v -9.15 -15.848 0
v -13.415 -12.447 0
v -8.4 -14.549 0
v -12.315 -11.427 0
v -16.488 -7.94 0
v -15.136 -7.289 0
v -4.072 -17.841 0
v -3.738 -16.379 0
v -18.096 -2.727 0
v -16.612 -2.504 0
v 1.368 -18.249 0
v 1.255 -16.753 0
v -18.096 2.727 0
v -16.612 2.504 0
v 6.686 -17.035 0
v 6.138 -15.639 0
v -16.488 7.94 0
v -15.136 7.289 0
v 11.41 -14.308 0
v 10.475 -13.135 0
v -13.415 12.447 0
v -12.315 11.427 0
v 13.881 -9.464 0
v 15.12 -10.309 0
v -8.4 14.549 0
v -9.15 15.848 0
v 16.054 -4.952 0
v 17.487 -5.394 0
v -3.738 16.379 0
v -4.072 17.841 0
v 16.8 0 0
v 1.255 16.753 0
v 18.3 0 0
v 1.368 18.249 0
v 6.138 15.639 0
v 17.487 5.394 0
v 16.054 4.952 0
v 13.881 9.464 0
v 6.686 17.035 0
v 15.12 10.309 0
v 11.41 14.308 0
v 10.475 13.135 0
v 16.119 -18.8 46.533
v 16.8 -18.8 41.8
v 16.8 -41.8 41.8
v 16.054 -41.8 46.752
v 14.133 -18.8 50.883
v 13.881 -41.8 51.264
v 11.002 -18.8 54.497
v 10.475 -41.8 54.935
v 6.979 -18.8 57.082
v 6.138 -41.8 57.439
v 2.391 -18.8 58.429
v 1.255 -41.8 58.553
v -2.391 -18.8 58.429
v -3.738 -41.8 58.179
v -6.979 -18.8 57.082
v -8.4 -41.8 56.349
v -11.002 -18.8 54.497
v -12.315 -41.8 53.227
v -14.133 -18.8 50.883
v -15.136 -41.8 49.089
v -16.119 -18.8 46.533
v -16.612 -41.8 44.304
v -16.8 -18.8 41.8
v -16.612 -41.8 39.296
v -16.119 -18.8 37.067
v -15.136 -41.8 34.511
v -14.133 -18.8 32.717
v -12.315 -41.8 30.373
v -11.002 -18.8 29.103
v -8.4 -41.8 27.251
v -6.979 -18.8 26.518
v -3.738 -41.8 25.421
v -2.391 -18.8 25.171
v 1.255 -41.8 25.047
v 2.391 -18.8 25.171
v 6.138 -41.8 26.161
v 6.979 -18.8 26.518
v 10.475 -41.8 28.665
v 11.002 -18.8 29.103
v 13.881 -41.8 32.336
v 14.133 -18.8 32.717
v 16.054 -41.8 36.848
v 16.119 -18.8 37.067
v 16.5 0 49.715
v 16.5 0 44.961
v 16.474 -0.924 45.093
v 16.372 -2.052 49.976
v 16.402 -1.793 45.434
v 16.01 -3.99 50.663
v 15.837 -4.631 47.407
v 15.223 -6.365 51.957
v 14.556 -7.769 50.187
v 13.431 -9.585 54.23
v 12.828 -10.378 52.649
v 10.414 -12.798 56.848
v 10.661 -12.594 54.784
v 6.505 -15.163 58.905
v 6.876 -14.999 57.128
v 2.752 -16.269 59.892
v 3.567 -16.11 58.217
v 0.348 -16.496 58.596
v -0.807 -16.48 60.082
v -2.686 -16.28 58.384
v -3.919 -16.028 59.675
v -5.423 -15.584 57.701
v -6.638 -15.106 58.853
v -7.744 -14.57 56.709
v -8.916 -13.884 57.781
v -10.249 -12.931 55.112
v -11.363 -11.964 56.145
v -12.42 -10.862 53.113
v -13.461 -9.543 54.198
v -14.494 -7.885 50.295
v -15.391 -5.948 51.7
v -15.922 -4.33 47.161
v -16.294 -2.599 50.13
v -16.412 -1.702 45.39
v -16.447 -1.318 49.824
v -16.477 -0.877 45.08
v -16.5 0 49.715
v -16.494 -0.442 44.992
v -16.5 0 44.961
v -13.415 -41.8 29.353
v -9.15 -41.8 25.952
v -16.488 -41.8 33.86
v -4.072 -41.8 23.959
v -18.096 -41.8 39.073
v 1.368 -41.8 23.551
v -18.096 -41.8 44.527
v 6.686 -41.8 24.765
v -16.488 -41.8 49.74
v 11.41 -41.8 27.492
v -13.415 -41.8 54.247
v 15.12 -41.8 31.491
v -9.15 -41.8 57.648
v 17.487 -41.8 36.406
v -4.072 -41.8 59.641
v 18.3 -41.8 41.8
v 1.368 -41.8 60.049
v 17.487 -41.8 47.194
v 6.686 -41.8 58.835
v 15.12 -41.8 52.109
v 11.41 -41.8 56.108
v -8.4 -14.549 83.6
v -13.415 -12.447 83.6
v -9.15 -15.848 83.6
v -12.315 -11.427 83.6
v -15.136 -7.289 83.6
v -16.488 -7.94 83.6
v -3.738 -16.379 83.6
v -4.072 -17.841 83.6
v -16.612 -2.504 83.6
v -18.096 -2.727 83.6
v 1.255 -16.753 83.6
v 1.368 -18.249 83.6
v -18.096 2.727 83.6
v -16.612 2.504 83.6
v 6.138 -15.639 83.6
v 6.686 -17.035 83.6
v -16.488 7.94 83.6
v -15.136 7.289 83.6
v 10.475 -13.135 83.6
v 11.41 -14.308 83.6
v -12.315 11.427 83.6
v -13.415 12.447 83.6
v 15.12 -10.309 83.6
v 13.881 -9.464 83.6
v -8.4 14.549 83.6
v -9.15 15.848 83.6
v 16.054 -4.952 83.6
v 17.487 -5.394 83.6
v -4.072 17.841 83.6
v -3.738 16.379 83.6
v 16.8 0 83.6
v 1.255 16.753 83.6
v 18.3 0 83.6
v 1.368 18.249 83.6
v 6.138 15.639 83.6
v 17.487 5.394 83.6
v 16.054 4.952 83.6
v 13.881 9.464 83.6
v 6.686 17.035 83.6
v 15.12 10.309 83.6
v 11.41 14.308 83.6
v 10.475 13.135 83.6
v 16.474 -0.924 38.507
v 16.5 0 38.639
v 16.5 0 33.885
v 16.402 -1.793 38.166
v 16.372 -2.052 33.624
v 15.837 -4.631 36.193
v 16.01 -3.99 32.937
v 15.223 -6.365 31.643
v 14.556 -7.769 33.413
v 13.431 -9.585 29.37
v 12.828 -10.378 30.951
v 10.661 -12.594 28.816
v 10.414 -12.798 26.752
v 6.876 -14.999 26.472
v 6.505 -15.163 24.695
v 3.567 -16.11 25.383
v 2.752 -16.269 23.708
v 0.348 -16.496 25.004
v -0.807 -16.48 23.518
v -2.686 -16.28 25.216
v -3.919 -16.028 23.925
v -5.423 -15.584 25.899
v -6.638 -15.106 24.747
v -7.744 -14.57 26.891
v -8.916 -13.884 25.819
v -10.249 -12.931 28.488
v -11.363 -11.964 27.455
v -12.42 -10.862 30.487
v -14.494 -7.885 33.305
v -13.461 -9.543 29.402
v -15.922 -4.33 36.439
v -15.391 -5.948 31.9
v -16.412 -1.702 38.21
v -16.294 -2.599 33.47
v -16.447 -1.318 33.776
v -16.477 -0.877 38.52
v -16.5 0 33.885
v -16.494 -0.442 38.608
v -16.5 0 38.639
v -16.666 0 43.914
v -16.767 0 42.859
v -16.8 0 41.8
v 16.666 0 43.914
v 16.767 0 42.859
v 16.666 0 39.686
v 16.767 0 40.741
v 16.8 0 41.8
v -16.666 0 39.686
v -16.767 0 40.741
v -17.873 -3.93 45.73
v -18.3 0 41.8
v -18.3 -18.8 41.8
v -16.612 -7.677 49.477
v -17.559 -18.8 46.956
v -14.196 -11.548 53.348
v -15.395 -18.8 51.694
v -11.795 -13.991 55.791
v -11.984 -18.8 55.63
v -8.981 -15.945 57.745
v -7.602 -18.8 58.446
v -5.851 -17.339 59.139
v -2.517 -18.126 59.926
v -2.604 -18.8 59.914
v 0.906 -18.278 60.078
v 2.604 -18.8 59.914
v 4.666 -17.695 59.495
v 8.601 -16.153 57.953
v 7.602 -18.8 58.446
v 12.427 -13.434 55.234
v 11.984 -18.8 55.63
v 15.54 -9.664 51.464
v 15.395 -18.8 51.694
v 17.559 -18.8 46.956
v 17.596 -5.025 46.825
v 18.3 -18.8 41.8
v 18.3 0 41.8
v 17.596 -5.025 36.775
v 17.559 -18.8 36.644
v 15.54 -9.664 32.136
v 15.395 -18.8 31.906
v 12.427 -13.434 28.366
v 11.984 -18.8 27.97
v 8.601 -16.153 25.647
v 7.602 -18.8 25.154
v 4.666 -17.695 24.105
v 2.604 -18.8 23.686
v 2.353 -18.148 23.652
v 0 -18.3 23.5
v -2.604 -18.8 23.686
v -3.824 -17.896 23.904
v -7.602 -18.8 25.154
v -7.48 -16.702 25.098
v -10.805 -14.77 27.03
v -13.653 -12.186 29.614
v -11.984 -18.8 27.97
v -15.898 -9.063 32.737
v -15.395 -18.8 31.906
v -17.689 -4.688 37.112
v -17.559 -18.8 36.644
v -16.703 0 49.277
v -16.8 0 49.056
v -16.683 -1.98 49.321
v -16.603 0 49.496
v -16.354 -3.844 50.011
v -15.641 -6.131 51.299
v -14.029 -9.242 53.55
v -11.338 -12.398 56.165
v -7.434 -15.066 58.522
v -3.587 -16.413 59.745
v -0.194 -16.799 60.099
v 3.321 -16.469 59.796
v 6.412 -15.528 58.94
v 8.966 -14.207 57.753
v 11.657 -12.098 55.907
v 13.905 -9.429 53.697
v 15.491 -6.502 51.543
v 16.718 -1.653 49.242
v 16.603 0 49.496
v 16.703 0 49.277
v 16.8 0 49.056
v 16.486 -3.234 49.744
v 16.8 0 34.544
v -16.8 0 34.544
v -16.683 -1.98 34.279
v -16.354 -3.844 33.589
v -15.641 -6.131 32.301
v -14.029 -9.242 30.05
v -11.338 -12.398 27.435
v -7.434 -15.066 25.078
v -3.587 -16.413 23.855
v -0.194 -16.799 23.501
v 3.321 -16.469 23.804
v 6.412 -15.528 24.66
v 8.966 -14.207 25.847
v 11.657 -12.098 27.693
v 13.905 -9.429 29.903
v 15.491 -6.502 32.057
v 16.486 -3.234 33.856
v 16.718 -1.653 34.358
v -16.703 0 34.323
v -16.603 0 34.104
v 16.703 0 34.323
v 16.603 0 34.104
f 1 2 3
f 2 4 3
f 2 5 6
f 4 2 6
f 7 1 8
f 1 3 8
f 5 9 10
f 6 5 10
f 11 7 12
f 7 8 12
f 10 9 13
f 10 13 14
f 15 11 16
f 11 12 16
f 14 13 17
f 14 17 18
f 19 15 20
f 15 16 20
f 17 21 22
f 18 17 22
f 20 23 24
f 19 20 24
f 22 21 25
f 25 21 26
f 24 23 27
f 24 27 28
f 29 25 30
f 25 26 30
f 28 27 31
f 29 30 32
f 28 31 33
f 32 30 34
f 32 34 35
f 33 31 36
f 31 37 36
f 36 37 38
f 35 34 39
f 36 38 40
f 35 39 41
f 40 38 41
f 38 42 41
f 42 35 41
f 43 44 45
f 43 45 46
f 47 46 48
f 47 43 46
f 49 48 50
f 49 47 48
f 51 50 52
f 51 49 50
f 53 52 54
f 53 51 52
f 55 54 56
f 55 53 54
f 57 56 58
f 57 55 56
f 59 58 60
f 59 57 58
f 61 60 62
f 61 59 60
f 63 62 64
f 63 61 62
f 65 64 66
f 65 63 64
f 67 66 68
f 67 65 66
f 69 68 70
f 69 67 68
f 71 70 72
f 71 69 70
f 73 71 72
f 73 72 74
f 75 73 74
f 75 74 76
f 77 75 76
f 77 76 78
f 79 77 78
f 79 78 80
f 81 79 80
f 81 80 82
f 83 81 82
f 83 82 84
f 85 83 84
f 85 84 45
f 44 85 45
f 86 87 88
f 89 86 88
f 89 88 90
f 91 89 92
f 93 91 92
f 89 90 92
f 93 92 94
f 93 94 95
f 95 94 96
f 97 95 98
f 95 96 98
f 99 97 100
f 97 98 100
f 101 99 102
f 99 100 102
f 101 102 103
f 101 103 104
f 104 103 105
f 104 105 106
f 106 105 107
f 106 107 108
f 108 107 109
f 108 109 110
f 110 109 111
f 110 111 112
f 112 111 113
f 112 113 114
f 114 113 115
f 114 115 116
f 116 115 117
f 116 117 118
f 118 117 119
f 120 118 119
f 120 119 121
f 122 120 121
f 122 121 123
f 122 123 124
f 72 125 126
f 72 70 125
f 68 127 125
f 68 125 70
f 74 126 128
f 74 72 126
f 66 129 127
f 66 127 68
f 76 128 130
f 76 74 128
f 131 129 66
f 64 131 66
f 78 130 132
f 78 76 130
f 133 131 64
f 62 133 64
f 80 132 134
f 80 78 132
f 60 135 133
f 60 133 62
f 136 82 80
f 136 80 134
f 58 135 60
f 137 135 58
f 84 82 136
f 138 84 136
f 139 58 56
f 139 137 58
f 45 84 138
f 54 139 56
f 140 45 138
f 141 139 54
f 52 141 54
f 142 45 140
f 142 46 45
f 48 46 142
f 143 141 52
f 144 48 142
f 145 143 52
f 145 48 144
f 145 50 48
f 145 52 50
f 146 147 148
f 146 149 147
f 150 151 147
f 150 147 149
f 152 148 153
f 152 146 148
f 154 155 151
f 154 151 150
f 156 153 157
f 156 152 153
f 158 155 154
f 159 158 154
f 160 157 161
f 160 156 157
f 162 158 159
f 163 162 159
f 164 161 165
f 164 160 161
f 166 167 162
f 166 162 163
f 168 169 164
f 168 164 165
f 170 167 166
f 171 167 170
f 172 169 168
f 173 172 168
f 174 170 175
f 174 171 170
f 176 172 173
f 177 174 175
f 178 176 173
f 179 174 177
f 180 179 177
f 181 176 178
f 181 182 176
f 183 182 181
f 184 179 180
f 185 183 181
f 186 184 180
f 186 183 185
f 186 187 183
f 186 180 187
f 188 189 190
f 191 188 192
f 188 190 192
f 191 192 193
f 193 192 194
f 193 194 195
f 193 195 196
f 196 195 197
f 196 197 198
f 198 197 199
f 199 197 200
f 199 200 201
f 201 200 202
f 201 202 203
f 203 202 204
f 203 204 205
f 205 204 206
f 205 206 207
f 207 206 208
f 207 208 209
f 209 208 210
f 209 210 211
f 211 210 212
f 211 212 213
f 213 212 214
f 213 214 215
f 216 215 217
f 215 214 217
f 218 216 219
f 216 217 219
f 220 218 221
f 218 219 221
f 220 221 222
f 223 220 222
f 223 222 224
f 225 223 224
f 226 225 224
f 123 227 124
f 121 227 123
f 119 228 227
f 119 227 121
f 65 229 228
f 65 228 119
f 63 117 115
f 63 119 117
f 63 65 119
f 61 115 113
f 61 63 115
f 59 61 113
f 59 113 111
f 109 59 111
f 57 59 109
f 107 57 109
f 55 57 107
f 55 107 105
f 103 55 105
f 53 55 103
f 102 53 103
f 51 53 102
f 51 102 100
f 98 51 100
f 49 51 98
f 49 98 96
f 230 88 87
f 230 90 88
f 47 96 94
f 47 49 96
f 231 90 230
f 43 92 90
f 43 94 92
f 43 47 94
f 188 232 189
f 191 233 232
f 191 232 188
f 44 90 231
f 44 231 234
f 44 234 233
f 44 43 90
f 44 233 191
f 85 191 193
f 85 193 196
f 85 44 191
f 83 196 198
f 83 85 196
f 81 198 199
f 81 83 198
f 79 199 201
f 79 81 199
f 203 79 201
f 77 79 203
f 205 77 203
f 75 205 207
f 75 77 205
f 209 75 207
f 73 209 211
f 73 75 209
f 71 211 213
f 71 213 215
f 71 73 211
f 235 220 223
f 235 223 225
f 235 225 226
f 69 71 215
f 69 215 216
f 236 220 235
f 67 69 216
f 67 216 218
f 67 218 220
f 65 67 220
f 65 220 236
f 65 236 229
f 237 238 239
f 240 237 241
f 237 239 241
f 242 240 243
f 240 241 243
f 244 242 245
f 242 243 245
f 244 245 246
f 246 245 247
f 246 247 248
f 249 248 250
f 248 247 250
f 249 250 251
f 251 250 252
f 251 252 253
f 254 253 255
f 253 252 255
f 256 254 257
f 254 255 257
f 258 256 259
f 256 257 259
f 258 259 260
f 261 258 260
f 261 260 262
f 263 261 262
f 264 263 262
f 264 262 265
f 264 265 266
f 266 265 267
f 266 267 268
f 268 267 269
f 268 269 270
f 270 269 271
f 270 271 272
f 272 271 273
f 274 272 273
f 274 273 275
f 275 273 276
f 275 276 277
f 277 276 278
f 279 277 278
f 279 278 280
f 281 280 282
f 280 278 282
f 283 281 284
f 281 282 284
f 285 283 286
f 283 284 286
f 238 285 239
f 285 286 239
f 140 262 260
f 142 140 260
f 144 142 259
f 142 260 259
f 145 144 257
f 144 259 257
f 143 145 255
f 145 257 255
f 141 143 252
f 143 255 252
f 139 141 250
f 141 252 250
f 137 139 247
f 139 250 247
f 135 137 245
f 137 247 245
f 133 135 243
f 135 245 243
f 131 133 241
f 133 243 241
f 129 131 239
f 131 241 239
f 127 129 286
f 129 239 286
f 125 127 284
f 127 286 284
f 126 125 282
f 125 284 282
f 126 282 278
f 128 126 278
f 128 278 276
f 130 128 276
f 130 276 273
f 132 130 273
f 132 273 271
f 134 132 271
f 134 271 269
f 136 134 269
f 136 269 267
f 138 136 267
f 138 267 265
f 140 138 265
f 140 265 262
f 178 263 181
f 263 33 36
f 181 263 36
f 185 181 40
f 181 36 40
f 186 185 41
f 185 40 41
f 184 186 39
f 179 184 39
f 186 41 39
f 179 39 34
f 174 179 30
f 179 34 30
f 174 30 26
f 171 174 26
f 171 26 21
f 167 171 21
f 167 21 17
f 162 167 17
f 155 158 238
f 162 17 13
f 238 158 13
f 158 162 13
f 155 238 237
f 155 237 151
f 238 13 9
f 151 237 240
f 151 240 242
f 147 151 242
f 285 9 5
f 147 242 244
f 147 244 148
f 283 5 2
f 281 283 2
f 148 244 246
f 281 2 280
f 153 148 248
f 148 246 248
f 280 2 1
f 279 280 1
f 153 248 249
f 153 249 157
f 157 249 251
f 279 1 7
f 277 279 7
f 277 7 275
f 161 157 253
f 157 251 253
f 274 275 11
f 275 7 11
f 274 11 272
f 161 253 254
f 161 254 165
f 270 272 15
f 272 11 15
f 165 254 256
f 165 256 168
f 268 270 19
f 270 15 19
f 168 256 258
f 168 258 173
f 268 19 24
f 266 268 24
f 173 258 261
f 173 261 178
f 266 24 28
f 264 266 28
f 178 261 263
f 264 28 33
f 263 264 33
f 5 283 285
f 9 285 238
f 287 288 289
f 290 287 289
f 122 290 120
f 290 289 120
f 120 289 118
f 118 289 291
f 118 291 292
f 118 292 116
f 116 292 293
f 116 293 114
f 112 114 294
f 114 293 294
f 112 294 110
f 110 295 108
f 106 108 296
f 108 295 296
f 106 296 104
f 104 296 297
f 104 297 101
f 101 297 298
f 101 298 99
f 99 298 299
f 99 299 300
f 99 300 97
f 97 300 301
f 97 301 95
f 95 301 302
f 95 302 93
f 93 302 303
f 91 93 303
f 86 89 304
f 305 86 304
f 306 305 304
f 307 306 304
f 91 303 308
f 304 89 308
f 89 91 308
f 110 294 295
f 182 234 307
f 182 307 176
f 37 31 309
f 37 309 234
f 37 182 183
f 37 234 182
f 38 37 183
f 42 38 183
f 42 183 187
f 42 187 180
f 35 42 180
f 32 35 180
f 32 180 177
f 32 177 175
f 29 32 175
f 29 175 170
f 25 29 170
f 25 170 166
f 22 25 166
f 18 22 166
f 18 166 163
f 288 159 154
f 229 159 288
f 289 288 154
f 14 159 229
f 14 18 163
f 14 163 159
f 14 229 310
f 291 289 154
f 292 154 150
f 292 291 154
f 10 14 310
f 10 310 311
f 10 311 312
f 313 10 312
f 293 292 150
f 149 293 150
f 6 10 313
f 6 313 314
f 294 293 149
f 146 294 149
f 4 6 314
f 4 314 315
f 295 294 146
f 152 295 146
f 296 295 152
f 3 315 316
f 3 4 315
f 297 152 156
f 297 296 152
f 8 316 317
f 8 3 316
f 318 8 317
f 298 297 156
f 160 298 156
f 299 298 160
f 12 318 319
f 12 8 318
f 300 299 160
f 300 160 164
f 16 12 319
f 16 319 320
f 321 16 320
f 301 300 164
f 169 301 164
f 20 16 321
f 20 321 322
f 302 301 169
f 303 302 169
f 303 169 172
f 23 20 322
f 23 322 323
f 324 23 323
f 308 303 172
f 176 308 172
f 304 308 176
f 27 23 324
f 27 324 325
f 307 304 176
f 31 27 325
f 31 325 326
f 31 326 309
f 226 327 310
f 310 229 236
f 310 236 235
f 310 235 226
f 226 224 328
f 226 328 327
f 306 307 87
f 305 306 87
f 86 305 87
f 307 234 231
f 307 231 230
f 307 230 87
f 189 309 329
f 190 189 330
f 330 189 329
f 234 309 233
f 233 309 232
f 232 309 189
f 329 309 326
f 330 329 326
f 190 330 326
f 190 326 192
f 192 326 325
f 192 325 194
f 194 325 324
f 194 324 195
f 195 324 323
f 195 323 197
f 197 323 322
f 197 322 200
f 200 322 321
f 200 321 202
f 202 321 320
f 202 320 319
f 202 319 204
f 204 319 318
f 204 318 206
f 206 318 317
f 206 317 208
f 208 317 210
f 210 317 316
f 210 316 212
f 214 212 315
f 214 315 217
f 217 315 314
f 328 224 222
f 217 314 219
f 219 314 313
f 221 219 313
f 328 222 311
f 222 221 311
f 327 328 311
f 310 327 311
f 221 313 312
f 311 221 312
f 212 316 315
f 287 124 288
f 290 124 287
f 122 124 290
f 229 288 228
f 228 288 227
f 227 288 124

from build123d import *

# Parameters (mm, degrees)
F0_R     = 18.3
F0_R_2   = 16.8
F1_DEPTH = 83.6
F3_R     = 18.3
F3_R_2   = 16.8
F4_DEPTH = 23
F5_DEPTH = 18.8
F6_R     = 18.3
F6_R_2   = 16.8
F7_DEPTH = 18.8
F8_R     = 16.5
F9_DEPTH = 102.5


with BuildPart() as f1:
    # F0 (on Top) → F1 (new body)
    with BuildSketch(Plane.XY):
        Circle(F0_R)
        Circle(F0_R_2, mode=Mode.SUBTRACT)
    extrude(amount=F1_DEPTH)

    # F3 (on offset) → F5 (cut)
    with BuildSketch(Plane.XZ.offset(18.8)):
        with Locations((0, 41.8)):
            Circle(F3_R)
        with Locations((0, 41.8)):
            Circle(F3_R_2, mode=Mode.SUBTRACT)
        with Locations((0, 41.8)):
            Circle(F3_R_2)
    extrude(amount=-F5_DEPTH, mode=Mode.SUBTRACT)



with BuildPart() as f4:
    # F3 (on offset) → F4 (new body)
    with BuildSketch(Plane.XZ.offset(18.8)):
        with Locations((0, 41.8)):
            Circle(F3_R)
        with Locations((0, 41.8)):
            Circle(F3_R_2, mode=Mode.SUBTRACT)
    extrude(amount=F4_DEPTH)


with BuildPart() as f1_1:
    add(f1.part)

    add(f4.part)  # F7 merges F4
    # F6 (on face) → F7 (join)
    with BuildSketch(Plane(origin=(0, -18.8, 0), x_dir=(-1, 0, 0), z_dir=(0, 1, 0))):
        with Locations((0, 41.8)):
            Circle(F6_R)
        with Locations((0, 41.8)):
            Circle(F6_R_2, mode=Mode.SUBTRACT)
    extrude(amount=F7_DEPTH)

    # F8 (on face) → F9 (cut)
    with BuildSketch(Plane(origin=(0, 0, 0), x_dir=(1, 0, 0), z_dir=(0, 0, -1))):
        Circle(F8_R)
    extrude(amount=-F9_DEPTH, mode=Mode.SUBTRACT)


solid = f1_1.part
